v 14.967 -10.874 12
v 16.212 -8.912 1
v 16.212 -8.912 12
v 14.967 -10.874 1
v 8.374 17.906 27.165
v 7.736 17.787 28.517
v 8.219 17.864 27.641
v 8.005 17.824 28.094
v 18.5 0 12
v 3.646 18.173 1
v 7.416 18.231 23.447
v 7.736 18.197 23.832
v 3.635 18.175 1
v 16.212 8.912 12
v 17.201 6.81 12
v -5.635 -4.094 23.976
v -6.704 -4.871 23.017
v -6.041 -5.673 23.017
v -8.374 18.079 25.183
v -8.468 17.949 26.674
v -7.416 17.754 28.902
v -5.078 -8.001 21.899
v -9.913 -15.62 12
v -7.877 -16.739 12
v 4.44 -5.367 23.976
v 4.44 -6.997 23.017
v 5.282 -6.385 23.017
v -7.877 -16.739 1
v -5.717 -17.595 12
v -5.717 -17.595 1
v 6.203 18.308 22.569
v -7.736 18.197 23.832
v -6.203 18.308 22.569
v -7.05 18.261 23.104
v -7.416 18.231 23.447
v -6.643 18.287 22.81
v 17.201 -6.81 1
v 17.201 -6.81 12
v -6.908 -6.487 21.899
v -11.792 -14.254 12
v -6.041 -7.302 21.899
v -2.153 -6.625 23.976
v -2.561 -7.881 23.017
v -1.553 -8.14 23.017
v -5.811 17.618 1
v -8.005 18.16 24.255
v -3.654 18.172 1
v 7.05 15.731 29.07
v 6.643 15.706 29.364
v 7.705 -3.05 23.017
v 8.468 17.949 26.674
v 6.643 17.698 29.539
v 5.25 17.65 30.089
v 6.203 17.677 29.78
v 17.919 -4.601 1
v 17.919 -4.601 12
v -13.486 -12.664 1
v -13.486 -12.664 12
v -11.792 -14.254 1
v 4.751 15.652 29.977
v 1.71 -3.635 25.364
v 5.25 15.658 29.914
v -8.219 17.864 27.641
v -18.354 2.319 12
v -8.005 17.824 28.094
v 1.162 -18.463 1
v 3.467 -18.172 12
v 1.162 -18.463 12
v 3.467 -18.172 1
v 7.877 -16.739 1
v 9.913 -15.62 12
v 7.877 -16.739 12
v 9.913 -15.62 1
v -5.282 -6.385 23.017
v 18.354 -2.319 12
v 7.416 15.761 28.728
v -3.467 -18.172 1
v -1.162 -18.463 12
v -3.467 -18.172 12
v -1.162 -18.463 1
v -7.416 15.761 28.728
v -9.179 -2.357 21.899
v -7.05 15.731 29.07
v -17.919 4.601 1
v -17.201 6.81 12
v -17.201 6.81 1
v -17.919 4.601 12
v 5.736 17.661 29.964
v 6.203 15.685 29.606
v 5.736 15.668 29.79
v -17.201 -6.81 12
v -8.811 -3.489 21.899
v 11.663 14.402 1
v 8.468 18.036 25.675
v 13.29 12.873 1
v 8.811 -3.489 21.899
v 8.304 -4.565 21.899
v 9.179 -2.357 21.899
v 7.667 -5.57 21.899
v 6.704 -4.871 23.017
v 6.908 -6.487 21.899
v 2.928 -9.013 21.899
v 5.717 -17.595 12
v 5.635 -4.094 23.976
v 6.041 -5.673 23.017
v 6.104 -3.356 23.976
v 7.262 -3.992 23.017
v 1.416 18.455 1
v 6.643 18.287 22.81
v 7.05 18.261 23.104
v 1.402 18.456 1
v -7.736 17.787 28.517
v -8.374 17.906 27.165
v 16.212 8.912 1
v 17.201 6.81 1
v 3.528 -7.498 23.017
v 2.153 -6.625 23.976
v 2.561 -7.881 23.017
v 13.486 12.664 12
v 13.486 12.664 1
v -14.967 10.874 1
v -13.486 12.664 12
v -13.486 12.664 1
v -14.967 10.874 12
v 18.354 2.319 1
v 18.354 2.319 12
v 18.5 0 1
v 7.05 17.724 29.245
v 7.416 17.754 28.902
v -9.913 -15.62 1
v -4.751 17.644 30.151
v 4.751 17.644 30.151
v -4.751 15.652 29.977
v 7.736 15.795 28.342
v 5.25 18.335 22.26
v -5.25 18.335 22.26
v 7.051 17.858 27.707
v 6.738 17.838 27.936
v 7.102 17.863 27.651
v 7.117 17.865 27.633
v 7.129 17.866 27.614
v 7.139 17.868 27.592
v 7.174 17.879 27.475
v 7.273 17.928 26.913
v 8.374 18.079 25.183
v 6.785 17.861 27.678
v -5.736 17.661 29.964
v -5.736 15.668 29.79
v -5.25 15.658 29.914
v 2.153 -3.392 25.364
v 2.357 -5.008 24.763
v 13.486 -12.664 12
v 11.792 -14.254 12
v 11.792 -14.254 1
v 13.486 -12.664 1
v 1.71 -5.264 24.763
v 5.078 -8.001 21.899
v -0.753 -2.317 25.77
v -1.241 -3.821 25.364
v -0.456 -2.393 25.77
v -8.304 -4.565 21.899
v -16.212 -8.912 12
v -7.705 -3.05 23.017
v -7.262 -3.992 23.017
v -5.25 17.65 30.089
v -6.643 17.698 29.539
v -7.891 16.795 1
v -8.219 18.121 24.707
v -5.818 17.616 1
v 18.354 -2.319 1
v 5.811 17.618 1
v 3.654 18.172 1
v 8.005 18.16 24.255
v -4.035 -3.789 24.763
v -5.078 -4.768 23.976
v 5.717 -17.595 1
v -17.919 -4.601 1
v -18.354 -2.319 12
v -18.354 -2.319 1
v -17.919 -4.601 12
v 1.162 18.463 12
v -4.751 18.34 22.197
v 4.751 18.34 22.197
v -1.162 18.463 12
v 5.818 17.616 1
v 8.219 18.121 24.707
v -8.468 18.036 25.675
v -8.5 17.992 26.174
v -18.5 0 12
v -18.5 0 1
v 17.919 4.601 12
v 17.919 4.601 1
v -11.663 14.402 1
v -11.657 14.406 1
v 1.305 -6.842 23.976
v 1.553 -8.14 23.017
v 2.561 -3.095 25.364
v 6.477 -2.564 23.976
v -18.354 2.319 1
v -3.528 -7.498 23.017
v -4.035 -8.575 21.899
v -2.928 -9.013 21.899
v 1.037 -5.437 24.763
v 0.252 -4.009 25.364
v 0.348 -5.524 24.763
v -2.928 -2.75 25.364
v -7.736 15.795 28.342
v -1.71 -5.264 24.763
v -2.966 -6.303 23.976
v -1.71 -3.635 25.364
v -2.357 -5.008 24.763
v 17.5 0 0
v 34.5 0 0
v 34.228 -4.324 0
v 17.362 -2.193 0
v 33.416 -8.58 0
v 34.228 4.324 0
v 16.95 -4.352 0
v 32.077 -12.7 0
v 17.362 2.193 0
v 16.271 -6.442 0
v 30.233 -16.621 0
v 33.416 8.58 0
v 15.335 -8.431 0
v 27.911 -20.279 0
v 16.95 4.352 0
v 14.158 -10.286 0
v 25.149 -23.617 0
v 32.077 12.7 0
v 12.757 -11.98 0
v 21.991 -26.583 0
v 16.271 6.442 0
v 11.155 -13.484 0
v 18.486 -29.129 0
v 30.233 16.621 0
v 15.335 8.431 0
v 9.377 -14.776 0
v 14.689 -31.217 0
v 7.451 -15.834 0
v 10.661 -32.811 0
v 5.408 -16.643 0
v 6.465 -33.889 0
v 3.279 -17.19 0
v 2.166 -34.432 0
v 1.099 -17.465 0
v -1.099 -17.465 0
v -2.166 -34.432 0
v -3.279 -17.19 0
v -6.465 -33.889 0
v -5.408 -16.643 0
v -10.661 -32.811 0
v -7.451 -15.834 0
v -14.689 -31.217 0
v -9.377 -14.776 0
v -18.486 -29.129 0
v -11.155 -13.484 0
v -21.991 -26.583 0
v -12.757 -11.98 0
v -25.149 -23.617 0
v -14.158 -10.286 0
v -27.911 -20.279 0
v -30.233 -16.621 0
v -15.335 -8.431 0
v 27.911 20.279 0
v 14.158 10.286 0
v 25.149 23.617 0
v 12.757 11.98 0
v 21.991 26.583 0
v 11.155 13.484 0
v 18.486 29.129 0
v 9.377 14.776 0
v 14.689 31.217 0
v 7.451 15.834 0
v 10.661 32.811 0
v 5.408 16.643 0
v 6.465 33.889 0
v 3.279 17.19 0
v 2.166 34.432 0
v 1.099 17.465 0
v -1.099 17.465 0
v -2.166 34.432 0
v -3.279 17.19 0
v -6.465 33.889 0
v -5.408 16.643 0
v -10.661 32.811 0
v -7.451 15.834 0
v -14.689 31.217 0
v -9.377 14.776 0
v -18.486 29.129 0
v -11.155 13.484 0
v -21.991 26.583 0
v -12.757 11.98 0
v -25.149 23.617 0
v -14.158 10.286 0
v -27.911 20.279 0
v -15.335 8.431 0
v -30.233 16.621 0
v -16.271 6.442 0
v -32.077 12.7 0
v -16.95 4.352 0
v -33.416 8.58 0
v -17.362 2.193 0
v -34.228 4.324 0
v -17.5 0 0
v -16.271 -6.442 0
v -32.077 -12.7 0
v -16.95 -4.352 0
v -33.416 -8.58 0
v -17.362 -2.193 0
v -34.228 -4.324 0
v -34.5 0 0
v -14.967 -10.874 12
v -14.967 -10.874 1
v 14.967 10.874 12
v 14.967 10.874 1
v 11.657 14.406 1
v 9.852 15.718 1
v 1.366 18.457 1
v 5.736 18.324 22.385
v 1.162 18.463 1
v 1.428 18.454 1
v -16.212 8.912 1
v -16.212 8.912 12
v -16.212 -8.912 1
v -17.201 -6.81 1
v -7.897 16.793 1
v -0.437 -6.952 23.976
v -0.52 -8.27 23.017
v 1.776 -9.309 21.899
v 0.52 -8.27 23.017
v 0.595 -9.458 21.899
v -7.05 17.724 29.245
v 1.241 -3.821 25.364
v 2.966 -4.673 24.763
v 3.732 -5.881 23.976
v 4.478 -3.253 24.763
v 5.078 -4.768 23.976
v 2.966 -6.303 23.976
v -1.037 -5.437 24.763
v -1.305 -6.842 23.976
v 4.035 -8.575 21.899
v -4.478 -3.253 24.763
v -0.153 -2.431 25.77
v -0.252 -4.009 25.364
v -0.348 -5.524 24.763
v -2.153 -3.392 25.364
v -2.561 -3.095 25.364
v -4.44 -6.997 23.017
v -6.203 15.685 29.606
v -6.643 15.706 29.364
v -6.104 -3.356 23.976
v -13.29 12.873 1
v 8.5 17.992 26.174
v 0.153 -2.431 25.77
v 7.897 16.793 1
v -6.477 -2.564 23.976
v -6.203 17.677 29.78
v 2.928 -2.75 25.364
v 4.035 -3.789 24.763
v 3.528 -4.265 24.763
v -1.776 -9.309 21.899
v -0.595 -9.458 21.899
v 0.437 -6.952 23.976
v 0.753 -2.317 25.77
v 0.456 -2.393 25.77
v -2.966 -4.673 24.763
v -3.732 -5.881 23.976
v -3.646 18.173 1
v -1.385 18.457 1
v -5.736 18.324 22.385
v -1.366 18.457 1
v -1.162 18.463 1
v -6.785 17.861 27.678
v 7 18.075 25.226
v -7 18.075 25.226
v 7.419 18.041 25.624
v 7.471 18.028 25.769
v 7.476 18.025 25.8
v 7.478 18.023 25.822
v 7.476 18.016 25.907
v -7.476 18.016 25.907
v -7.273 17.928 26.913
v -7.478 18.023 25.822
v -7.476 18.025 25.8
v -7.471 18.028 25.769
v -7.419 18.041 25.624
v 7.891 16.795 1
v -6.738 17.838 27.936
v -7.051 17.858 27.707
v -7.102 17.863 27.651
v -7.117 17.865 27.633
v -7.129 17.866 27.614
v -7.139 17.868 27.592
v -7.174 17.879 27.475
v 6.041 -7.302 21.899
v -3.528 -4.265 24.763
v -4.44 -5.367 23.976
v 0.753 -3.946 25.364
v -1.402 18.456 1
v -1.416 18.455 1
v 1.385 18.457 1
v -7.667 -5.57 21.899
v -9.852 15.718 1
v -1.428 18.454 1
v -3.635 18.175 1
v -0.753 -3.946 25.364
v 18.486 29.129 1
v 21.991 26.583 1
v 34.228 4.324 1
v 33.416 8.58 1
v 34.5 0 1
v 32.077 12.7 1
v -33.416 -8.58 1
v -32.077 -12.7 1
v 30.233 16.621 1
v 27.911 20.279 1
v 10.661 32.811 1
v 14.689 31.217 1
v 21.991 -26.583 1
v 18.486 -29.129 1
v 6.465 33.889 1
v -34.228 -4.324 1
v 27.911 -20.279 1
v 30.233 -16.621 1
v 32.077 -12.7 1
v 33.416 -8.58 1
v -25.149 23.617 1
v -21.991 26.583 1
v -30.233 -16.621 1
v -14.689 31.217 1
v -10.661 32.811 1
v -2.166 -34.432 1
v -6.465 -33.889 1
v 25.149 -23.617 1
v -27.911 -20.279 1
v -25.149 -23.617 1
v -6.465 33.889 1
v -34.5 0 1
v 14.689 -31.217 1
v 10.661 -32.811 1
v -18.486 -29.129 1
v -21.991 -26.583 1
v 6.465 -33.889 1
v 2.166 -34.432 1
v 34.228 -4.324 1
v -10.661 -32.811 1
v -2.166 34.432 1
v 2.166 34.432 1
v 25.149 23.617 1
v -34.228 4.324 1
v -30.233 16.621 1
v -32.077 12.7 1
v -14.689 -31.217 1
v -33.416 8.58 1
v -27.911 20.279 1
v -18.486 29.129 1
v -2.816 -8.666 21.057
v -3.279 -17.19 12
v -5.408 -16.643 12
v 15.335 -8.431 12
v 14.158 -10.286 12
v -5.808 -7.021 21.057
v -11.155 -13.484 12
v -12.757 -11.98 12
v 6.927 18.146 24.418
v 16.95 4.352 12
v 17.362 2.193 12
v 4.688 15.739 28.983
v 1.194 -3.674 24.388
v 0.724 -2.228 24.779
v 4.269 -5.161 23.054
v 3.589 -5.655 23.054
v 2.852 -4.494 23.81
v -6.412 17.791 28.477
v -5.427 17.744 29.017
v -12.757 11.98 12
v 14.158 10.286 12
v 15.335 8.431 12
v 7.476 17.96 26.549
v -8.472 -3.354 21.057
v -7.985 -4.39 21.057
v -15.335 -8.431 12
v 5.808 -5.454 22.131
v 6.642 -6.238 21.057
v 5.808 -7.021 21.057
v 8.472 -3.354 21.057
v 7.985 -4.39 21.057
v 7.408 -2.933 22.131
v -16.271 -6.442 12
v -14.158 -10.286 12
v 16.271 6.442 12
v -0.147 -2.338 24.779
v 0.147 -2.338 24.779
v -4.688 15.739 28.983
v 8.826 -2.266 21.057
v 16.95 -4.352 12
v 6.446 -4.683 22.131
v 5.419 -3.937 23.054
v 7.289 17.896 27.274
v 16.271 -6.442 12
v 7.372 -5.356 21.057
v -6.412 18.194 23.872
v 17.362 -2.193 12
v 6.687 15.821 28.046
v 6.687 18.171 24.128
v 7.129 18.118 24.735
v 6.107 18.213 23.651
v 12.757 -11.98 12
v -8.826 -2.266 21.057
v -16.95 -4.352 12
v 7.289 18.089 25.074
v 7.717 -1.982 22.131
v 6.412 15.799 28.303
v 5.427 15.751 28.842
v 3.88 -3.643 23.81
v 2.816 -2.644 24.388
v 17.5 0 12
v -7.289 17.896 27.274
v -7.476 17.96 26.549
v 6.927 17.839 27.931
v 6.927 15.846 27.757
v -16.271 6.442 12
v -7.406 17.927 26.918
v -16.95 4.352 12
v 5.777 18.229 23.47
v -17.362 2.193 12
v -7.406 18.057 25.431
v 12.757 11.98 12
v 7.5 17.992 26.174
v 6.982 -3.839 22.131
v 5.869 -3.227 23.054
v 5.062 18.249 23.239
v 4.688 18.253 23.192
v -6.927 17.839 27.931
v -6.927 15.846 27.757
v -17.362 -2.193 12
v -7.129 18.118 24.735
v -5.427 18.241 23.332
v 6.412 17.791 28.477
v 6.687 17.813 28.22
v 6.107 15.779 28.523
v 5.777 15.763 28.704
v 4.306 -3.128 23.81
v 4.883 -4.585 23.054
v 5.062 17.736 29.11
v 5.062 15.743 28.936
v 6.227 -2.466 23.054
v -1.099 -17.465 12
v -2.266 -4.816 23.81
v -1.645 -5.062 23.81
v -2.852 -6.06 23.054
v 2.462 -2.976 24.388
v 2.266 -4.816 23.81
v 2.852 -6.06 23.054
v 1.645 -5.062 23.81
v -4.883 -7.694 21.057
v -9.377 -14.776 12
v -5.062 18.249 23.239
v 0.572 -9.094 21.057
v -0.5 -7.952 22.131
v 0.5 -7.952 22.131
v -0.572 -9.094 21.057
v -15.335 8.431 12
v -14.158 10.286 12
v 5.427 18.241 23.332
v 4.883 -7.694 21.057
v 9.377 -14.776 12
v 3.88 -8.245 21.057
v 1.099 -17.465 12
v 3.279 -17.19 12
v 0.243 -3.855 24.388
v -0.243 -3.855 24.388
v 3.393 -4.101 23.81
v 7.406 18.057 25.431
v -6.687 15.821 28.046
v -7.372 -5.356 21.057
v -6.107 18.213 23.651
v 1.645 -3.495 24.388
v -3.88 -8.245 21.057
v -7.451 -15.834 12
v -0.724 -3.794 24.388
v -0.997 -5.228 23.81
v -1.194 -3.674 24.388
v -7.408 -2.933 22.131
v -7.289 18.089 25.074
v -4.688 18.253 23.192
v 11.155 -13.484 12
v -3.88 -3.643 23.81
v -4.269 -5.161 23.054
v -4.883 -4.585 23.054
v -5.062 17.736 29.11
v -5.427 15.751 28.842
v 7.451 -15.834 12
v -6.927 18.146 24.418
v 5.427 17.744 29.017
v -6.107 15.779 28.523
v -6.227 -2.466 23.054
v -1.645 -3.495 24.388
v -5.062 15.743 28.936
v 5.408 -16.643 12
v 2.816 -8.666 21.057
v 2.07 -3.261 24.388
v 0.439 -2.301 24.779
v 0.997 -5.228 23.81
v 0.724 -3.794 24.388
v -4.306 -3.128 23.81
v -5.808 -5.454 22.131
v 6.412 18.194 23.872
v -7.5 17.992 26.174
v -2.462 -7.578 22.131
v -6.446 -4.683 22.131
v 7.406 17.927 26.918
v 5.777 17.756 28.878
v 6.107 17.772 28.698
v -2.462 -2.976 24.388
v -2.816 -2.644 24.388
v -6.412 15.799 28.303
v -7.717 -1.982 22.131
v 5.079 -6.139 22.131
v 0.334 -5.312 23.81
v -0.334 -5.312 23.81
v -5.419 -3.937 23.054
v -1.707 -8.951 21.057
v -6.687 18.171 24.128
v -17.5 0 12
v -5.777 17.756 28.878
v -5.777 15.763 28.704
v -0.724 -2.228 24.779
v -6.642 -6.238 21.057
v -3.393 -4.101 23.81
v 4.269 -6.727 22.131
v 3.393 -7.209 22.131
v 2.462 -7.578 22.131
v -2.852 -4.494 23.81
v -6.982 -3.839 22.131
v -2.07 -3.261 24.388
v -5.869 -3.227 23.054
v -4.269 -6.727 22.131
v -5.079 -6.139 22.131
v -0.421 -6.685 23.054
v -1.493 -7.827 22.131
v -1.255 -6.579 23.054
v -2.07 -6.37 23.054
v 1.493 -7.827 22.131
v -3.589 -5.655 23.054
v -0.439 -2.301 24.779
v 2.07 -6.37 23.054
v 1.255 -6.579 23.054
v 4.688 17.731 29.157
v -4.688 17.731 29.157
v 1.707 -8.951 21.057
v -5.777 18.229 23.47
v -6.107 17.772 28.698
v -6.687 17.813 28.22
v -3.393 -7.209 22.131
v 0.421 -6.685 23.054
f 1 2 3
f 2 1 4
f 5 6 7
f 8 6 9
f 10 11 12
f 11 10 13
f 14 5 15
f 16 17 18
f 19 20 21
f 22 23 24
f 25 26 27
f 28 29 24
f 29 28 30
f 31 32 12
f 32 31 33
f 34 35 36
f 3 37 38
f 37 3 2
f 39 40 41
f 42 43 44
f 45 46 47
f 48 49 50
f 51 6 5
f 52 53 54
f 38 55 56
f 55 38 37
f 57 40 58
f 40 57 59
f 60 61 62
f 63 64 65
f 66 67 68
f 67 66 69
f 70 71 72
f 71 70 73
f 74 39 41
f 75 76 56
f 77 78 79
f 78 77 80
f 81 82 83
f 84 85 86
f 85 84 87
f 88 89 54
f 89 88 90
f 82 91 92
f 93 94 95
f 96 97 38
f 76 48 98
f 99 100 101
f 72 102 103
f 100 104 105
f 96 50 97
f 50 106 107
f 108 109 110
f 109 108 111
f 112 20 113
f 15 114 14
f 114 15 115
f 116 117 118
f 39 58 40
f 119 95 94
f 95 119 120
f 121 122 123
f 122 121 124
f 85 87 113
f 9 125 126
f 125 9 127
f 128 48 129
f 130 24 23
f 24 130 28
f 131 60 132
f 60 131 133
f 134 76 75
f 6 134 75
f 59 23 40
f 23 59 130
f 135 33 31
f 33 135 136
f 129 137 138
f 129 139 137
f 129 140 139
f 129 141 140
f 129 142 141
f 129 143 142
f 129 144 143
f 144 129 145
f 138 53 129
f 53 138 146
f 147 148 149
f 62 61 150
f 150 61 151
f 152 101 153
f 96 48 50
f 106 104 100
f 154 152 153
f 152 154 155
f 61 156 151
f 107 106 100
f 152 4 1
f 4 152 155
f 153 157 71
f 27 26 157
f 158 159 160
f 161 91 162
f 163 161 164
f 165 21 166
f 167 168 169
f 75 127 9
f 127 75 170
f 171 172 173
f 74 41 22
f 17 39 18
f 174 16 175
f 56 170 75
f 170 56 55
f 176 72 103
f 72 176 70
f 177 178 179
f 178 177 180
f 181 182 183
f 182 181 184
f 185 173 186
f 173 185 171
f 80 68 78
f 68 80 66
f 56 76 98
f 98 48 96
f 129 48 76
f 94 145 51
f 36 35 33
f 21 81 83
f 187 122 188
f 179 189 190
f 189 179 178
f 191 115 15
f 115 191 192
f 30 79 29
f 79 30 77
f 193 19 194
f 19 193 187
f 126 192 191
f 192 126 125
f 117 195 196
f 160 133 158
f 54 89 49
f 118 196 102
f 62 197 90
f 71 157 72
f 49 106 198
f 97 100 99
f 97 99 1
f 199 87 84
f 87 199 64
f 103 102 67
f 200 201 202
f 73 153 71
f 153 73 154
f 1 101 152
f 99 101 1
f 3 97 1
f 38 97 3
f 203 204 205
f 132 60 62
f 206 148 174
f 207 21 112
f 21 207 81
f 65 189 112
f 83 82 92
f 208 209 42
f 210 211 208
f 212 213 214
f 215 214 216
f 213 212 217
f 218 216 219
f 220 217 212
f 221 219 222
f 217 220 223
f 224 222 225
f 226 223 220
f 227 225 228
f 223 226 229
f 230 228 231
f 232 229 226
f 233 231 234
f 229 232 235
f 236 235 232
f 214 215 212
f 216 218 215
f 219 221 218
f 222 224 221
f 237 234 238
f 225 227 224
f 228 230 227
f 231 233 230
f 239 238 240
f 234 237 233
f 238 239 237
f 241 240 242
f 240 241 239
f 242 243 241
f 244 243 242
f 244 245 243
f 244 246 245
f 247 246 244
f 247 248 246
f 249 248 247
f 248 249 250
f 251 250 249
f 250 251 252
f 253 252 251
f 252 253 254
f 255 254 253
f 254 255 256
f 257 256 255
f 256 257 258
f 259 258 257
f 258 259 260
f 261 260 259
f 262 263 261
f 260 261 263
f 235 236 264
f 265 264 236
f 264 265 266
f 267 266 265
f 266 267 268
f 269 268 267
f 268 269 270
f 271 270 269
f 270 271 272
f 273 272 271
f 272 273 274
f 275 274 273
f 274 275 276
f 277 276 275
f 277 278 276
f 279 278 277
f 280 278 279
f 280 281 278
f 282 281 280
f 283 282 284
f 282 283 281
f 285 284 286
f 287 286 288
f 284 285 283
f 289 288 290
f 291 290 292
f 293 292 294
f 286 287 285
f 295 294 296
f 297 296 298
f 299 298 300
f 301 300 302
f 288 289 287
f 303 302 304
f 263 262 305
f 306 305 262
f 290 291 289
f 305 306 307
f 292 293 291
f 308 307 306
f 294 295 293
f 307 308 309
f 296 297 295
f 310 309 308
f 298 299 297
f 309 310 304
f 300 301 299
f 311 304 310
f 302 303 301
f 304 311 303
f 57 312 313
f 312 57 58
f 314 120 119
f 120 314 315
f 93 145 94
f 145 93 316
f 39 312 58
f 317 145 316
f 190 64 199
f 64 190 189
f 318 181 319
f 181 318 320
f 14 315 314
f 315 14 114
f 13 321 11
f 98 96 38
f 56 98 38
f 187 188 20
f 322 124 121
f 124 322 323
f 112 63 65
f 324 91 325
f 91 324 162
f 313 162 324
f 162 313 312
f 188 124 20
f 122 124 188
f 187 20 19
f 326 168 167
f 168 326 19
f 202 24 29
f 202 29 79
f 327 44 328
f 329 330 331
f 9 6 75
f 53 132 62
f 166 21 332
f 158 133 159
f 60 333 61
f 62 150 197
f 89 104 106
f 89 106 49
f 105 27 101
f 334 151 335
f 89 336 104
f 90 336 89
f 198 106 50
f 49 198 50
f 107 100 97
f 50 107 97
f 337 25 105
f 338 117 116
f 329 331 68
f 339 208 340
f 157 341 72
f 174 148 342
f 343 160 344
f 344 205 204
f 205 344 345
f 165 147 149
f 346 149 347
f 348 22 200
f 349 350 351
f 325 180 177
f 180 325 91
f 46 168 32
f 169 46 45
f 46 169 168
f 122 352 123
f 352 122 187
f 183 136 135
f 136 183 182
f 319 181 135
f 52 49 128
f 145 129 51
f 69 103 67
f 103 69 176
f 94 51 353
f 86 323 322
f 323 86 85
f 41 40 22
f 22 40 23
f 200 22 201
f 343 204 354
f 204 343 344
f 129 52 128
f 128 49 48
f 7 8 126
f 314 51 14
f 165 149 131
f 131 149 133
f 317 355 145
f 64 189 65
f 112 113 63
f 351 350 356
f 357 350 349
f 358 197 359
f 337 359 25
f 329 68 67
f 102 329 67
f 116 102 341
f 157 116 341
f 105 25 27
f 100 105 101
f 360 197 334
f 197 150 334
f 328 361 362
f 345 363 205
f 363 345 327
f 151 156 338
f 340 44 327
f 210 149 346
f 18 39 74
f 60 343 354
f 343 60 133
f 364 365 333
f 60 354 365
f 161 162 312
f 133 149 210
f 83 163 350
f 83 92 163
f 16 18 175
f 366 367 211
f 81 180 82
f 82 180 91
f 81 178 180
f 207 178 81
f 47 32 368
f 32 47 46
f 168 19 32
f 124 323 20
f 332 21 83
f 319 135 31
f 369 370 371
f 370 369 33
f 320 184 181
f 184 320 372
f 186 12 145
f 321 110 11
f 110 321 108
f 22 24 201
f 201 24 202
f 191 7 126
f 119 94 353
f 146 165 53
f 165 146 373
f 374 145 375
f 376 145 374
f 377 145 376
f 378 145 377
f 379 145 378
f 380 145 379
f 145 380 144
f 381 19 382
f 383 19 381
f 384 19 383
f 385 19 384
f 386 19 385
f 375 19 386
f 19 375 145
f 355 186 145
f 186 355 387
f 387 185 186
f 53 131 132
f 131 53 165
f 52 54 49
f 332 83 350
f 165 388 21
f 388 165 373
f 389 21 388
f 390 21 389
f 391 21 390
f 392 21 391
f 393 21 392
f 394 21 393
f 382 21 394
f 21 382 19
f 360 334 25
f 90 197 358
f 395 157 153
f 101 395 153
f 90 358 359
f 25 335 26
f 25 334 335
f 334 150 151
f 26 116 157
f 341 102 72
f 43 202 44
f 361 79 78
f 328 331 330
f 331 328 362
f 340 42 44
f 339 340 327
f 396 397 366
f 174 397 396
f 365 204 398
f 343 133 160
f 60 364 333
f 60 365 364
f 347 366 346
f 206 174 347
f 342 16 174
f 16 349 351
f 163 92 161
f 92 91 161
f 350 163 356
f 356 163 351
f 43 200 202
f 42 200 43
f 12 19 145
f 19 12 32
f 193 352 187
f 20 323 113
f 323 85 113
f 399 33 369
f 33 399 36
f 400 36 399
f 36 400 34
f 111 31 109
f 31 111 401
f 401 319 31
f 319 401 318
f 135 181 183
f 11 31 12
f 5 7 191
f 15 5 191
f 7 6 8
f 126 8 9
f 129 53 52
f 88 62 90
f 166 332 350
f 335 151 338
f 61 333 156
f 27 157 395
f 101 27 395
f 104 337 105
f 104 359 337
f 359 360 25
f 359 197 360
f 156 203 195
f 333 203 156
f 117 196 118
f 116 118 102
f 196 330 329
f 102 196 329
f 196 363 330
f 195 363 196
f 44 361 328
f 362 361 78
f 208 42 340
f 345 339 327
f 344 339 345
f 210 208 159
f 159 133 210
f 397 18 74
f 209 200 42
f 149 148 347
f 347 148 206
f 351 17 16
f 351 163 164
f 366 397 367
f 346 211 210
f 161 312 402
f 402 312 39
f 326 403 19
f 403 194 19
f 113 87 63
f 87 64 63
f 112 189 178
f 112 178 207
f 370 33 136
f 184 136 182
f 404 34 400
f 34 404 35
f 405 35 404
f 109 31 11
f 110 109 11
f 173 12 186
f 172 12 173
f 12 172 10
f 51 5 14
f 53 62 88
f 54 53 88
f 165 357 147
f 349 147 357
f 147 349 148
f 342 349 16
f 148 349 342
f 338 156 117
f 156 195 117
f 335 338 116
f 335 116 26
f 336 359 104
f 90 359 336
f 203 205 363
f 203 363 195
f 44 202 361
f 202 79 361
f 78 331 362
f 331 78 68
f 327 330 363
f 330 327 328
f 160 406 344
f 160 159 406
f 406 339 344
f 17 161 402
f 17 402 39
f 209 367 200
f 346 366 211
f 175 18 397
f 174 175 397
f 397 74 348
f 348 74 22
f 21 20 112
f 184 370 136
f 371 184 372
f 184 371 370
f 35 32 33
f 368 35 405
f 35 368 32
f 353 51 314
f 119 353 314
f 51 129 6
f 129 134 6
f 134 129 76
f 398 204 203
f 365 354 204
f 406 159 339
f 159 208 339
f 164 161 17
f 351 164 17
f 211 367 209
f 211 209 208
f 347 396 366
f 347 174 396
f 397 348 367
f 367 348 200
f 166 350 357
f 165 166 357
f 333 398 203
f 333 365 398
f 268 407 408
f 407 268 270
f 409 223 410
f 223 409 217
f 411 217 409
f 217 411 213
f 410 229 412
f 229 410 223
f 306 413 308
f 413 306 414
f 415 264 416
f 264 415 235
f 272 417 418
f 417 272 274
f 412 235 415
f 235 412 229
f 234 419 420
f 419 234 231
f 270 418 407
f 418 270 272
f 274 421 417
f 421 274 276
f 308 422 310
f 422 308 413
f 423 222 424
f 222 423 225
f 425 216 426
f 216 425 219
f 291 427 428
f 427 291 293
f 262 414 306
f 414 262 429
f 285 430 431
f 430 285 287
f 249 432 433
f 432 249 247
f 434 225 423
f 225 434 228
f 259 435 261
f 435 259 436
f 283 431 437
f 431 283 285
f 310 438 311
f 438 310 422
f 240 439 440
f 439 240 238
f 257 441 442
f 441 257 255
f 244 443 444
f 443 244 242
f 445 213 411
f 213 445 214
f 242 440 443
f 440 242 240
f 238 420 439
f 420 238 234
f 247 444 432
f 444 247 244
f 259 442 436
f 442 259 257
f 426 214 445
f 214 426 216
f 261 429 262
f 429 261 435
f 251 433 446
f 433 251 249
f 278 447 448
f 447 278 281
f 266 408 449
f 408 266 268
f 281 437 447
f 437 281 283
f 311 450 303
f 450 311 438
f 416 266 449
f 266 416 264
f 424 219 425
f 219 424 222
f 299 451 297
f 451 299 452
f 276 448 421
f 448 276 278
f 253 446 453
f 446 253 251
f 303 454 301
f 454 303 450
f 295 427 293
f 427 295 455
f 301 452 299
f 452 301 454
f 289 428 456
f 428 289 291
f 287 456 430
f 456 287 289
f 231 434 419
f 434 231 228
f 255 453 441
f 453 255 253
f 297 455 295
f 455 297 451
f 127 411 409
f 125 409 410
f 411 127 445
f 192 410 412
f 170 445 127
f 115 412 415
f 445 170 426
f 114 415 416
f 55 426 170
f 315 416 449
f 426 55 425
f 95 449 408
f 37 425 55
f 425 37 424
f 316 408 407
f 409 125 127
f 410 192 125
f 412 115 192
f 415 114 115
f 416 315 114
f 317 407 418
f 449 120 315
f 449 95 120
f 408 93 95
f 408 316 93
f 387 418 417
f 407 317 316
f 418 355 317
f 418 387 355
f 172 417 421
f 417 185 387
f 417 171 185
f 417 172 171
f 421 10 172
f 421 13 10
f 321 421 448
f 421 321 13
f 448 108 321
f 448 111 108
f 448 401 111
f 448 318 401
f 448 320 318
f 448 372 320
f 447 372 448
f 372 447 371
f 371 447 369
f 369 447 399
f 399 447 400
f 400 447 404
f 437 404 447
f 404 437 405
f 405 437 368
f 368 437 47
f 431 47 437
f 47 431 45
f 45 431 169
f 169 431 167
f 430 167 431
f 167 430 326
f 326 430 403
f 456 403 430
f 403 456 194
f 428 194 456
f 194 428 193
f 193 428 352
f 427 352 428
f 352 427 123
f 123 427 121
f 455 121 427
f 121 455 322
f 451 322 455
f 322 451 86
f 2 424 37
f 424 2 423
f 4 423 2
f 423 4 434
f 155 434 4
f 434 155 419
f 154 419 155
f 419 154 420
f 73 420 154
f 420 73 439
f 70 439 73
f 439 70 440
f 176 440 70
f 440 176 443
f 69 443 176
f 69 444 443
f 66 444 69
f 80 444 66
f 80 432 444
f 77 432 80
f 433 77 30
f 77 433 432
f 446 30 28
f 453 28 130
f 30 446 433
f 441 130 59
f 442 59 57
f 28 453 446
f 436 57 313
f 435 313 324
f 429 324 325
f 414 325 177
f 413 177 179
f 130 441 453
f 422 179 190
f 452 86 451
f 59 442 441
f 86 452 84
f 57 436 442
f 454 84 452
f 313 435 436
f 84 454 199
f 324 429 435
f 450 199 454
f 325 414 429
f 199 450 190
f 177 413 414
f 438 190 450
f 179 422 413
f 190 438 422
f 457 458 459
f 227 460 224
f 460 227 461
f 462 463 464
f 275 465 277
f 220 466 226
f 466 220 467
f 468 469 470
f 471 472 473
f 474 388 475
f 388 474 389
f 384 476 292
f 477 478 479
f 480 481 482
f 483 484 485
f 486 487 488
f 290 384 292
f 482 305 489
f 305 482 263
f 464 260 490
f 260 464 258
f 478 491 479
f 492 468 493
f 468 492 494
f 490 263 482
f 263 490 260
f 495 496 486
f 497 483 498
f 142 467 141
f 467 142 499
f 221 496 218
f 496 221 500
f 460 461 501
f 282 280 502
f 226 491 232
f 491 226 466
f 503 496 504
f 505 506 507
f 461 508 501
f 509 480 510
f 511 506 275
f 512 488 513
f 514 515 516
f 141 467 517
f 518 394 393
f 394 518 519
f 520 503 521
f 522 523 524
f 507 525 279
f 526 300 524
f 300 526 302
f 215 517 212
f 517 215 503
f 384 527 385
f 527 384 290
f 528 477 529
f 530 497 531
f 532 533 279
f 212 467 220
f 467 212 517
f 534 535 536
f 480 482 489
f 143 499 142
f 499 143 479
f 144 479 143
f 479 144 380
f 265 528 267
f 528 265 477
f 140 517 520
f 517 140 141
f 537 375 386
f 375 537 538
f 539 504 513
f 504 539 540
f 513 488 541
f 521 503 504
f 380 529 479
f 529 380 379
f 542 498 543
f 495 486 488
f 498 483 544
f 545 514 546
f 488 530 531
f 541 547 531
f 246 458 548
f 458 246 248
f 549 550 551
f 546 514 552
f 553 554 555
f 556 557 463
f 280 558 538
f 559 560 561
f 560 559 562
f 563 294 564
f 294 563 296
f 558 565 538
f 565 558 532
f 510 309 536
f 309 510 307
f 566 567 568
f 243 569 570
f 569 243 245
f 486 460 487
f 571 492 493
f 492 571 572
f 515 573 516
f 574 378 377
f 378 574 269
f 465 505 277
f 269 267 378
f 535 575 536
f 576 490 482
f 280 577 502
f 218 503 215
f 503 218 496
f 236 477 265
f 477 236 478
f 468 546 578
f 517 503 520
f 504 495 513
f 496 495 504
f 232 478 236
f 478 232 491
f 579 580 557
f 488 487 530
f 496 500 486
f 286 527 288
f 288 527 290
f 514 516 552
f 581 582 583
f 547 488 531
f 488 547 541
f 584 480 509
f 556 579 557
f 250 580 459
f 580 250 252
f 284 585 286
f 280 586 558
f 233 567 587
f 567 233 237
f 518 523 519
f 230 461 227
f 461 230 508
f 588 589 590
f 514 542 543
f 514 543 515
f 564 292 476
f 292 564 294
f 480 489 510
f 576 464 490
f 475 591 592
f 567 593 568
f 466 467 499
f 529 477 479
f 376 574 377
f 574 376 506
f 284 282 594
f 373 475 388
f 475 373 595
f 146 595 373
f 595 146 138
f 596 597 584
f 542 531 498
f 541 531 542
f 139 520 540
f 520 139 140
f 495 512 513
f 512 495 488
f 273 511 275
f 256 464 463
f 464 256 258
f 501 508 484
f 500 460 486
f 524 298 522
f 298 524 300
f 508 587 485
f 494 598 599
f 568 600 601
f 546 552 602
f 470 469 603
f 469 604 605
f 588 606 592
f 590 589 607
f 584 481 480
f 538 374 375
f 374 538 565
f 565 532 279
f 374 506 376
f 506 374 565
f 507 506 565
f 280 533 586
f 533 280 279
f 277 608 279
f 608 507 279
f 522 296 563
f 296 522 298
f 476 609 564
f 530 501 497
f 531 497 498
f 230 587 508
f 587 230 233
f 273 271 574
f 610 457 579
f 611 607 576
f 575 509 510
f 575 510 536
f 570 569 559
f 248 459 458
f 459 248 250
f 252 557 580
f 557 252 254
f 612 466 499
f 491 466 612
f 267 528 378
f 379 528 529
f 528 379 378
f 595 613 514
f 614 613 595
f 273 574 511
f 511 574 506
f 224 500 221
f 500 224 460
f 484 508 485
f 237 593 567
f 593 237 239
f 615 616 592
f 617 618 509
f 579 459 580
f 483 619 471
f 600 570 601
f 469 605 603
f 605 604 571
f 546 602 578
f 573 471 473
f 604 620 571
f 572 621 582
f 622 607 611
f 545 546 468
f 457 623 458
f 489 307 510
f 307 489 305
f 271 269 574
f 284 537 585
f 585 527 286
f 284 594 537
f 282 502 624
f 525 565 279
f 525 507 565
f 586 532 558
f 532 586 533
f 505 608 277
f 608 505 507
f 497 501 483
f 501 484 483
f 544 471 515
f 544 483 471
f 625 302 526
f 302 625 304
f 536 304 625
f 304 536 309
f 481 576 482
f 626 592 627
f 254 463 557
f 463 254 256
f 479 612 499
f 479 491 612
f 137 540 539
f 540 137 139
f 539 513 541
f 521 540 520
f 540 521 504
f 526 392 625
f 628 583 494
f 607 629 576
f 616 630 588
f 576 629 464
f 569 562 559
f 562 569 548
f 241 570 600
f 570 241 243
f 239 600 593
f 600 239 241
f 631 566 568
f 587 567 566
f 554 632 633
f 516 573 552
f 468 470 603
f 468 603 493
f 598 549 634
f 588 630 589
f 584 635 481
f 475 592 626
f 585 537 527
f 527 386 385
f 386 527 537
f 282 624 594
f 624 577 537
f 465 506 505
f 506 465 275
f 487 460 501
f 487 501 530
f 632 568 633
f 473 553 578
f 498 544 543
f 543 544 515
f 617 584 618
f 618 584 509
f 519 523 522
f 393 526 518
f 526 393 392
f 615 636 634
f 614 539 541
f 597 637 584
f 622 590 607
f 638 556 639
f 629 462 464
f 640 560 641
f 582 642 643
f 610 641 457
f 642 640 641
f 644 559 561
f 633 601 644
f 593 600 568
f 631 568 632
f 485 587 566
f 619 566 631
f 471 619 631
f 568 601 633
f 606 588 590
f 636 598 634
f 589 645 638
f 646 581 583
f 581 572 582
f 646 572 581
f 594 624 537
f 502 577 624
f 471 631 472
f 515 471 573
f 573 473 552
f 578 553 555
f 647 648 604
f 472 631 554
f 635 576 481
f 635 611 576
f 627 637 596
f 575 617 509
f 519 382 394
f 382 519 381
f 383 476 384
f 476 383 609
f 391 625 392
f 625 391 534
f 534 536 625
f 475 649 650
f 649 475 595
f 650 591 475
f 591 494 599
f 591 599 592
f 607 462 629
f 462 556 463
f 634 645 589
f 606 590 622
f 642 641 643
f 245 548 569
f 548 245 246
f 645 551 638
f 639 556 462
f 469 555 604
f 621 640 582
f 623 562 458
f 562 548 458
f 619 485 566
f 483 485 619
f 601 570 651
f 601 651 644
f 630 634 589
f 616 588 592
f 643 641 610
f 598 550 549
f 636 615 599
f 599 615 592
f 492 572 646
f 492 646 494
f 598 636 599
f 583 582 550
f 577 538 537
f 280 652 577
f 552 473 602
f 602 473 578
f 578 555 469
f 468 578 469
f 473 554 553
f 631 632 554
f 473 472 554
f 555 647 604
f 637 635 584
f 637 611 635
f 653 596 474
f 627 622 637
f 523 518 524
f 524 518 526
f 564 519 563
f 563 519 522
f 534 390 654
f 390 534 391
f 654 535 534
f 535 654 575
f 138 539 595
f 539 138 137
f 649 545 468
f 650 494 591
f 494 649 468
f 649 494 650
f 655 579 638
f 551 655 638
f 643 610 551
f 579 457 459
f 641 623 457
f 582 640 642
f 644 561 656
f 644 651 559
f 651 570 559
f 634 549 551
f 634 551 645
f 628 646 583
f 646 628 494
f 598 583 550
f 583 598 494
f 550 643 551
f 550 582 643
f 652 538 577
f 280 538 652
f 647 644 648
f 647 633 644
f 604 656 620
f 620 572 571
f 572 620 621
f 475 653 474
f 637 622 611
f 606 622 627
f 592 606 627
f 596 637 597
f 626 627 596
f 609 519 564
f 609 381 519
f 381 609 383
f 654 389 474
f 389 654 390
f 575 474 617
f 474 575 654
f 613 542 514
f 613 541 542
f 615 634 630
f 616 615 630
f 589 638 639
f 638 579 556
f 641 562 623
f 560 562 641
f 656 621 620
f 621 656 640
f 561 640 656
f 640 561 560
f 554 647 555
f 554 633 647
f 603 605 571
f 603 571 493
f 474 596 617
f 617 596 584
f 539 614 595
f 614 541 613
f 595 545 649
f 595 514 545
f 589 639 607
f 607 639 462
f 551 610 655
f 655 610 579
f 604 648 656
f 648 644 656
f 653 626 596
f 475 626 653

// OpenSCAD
WALL_THICKNESS = 1;
BASE_DIA = 35;
BASE_HEIGHT = 12;

NOZZLE_WIDTH = 15;
NOZZLE_DIA = 6;
NOZZLE_ANGLE = 85;

NOZZLE_LENGTH = 16;
NOZZLE_HEIGHT = 32;

BRIM_DIA = BASE_DIA + 34;
BRIM_THICKNESS = WALL_THICKNESS;

$fn = 50;

module duct(wt = 0) {
    dia = (NOZZLE_WIDTH + 2 * wt + BASE_DIA)/2;
    hull() {
        cylinder(d = BASE_DIA + 2 * wt, h = BASE_HEIGHT);
        translate([0, 0, dia/2])
        sphere(d = dia);

        nozzle_dia = NOZZLE_DIA + 2 * wt;
        translate([0, NOZZLE_LENGTH, NOZZLE_HEIGHT - NOZZLE_DIA])
        rotate([-NOZZLE_ANGLE, 0, 0]) {
            translate([-(NOZZLE_WIDTH-NOZZLE_DIA)/2, 0, 0])
            cylinder(d = nozzle_dia, h = 2);
            translate([(NOZZLE_WIDTH-NOZZLE_DIA)/2, 0, 0])
            cylinder(d = nozzle_dia, h = 2);
        }
        translate([0, 0, dia/2])
        sphere(d = dia);
    }
}

module neg() {
    duct();
}

module pos() {
    duct(WALL_THICKNESS);
}

module nozzle() {
   difference() {
      union() {
          pos();
          cylinder(d = BRIM_DIA, h = BRIM_THICKNESS);
      }
       #neg();
   }
}

nozzle();
